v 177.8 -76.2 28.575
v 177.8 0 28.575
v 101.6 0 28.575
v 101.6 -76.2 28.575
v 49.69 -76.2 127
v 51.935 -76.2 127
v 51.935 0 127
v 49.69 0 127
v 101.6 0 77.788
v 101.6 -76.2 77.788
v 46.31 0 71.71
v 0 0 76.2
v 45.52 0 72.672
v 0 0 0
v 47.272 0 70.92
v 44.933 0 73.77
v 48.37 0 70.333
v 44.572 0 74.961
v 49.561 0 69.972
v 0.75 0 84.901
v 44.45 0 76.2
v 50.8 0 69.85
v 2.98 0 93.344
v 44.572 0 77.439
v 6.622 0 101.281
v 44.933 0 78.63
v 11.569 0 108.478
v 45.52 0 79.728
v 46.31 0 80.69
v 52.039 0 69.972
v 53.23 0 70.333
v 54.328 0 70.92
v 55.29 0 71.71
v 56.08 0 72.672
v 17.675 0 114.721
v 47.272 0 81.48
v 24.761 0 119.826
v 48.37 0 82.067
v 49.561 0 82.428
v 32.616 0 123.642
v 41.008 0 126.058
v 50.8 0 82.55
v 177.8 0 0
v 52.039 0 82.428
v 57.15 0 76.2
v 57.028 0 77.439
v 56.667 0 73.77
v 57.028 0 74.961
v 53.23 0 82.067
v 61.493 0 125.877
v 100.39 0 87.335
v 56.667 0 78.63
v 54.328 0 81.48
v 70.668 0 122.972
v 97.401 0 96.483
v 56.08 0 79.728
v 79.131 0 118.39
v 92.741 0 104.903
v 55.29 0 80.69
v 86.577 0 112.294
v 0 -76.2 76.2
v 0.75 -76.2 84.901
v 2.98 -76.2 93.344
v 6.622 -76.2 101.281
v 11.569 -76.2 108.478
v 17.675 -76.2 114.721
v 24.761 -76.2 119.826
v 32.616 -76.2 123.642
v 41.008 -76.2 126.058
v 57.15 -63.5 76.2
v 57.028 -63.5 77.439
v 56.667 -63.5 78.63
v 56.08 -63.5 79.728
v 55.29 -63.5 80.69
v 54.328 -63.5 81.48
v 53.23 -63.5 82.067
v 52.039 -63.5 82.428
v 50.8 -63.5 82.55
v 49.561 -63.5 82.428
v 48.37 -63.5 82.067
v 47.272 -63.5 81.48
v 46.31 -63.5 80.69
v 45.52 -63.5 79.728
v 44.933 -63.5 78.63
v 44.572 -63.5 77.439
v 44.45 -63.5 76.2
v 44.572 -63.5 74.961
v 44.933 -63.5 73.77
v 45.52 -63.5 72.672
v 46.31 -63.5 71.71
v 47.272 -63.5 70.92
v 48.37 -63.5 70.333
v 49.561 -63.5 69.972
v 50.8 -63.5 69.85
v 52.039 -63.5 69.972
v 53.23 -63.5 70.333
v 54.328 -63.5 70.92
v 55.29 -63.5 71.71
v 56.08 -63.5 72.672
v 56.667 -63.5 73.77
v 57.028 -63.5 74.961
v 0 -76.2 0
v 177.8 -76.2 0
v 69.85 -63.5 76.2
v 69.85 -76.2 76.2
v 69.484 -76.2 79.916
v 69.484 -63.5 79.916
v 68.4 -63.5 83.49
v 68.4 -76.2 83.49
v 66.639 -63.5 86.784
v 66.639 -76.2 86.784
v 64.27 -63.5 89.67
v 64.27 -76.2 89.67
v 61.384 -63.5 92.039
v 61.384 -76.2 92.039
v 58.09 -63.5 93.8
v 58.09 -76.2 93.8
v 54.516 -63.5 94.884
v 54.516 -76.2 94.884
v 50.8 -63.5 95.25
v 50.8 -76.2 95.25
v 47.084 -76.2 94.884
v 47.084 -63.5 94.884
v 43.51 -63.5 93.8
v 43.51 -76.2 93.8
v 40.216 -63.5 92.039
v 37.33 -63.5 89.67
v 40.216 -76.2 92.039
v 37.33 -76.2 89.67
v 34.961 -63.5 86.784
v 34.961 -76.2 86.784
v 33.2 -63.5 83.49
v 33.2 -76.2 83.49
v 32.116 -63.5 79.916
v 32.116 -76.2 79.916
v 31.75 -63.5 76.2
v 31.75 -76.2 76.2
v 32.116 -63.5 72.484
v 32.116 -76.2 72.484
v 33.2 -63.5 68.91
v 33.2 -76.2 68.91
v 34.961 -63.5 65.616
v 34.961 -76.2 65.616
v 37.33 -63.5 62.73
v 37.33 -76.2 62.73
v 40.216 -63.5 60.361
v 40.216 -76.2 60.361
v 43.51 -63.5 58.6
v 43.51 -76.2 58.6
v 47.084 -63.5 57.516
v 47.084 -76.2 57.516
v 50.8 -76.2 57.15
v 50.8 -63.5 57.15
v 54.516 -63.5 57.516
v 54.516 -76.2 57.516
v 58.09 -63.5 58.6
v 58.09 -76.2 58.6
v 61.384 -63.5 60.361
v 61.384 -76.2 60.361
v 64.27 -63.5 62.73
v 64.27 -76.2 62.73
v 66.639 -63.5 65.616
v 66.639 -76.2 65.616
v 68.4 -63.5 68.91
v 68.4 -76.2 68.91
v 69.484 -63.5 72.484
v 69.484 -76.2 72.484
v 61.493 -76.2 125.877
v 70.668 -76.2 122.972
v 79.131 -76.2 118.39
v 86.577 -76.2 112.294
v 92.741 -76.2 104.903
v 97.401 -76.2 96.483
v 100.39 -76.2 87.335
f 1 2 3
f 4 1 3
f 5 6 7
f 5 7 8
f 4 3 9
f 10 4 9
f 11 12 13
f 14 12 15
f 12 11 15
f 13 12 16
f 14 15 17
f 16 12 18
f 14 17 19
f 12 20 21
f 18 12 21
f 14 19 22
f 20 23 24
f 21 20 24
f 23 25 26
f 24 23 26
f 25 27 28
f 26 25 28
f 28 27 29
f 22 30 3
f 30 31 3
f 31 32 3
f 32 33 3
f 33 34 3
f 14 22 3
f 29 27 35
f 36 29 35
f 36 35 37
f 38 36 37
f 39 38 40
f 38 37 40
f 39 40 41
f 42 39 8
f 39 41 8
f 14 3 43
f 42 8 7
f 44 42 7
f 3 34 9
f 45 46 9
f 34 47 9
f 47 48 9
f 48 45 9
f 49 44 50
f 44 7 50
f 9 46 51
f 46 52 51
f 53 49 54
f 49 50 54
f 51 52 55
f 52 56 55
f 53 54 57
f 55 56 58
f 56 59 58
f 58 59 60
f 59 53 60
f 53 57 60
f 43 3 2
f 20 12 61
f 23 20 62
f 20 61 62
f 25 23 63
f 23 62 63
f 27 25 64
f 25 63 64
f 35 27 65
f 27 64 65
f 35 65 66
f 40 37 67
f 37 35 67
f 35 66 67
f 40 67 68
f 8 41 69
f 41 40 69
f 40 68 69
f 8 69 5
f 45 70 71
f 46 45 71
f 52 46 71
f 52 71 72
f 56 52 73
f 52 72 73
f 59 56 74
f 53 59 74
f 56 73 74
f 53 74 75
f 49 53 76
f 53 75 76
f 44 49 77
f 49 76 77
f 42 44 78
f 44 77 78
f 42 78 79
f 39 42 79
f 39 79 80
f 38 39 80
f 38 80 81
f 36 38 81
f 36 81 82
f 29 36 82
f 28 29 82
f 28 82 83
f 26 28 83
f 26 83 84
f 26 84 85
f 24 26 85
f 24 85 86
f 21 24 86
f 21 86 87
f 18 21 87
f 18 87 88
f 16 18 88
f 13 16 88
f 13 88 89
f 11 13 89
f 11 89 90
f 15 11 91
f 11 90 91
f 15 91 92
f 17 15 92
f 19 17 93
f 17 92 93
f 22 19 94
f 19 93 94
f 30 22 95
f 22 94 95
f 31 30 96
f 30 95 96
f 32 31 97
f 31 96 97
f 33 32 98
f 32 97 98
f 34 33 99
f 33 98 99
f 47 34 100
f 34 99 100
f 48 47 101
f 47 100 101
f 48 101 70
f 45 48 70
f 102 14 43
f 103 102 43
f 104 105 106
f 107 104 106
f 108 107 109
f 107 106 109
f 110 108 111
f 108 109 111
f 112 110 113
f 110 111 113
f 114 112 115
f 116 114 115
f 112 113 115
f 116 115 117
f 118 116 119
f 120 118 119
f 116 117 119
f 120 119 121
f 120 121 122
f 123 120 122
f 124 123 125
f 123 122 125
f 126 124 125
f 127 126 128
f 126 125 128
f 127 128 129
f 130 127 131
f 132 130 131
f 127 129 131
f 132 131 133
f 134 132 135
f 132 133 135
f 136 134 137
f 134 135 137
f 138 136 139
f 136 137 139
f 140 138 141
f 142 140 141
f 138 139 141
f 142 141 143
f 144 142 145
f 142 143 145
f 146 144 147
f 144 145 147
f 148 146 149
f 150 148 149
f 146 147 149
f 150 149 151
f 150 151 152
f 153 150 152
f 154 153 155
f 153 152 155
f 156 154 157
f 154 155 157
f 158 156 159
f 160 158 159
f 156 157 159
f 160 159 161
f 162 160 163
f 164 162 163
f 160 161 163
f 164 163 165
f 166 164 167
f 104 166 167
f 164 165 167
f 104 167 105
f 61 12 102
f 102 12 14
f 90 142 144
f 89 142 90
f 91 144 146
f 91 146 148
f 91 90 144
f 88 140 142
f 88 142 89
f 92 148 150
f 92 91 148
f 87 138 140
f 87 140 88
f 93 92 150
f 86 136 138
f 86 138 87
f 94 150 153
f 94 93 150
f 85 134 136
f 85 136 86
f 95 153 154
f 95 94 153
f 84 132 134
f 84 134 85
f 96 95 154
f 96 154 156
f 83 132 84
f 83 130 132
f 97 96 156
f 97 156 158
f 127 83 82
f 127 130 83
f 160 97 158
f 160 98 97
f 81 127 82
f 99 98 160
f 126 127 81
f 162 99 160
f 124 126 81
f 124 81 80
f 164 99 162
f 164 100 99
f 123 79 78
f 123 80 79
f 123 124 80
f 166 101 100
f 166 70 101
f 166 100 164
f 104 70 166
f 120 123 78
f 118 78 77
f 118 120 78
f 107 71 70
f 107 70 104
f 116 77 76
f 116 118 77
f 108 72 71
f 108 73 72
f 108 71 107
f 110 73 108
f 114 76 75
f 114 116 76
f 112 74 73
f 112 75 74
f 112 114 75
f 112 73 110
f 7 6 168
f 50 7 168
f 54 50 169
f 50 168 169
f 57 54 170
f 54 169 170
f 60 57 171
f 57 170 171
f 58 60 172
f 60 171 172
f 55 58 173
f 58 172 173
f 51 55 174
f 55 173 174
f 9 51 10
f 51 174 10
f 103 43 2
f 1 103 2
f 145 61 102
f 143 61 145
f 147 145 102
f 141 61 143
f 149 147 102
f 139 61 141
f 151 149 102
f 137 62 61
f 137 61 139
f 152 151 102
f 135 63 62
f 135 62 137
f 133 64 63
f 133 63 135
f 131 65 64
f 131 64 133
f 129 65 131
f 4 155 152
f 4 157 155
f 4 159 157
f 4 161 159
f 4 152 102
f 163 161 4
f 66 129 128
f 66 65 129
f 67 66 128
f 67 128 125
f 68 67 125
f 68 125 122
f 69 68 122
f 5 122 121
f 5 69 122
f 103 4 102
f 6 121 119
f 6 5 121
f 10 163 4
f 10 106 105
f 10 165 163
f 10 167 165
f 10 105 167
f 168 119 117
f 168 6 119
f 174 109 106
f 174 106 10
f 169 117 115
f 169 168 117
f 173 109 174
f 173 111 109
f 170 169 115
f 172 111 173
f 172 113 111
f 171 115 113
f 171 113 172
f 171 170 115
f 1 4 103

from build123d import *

# Parameters (mm, degrees)
F1_DEPTH = 76.2
F3_DEPTH = 76.201
F4_R     = 19.05
F4_R_2   = 6.35
F5_DEPTH = 12.7
F6_DEPTH = 76.201


with BuildPart() as f1:
    # F0 (on Front) → F1 (new body)
    with BuildSketch(Plane.XZ):
        Polygon((0, 127), (0, 0), (177.8, 0), (177.8, 28.575), (101.6, 28.575), (101.6, 127), align=None)
    extrude(amount=F1_DEPTH)

    # F2 (on face) → F3 (cut, through all)
    with BuildSketch(Plane.XZ.offset(76.2)):
        with BuildLine():
            Line((0, 127), (0, 76.2))
            ThreePointArc((0, 76.2), (14.4878771466, 111.7306783097), (49.6898018168, 127))
            Line((49.6898018168, 127), (0, 127))
        make_face()
        with BuildLine():
            Line((101.6, 127), (51.9350028707, 127))
            ThreePointArc((51.9350028707, 127), (86.5773951149, 112.2938432981), (101.6, 77.7875))
            Line((101.6, 77.7875), (101.6, 127))
        make_face()
    extrude(amount=-F3_DEPTH, mode=Mode.SUBTRACT)

    # F4 (on face) → F5 (cut)
    with BuildSketch(Plane.XZ.offset(76.2)):
        with Locations((50.8, 76.2)):
            Circle(F4_R)
        with Locations((50.8, 76.2)):
            Circle(F4_R_2, mode=Mode.SUBTRACT)
    extrude(amount=-F5_DEPTH, mode=Mode.SUBTRACT)

    # F6 (cut, through all): a face of the model
    f6_faces = [f1.faces().sort_by_distance(p)[0] for p in [
        (50.8, -76.2, 76.2),
    ]]
    extrude(f6_faces, amount=-F6_DEPTH, mode=Mode.SUBTRACT)


solid = f1.part
